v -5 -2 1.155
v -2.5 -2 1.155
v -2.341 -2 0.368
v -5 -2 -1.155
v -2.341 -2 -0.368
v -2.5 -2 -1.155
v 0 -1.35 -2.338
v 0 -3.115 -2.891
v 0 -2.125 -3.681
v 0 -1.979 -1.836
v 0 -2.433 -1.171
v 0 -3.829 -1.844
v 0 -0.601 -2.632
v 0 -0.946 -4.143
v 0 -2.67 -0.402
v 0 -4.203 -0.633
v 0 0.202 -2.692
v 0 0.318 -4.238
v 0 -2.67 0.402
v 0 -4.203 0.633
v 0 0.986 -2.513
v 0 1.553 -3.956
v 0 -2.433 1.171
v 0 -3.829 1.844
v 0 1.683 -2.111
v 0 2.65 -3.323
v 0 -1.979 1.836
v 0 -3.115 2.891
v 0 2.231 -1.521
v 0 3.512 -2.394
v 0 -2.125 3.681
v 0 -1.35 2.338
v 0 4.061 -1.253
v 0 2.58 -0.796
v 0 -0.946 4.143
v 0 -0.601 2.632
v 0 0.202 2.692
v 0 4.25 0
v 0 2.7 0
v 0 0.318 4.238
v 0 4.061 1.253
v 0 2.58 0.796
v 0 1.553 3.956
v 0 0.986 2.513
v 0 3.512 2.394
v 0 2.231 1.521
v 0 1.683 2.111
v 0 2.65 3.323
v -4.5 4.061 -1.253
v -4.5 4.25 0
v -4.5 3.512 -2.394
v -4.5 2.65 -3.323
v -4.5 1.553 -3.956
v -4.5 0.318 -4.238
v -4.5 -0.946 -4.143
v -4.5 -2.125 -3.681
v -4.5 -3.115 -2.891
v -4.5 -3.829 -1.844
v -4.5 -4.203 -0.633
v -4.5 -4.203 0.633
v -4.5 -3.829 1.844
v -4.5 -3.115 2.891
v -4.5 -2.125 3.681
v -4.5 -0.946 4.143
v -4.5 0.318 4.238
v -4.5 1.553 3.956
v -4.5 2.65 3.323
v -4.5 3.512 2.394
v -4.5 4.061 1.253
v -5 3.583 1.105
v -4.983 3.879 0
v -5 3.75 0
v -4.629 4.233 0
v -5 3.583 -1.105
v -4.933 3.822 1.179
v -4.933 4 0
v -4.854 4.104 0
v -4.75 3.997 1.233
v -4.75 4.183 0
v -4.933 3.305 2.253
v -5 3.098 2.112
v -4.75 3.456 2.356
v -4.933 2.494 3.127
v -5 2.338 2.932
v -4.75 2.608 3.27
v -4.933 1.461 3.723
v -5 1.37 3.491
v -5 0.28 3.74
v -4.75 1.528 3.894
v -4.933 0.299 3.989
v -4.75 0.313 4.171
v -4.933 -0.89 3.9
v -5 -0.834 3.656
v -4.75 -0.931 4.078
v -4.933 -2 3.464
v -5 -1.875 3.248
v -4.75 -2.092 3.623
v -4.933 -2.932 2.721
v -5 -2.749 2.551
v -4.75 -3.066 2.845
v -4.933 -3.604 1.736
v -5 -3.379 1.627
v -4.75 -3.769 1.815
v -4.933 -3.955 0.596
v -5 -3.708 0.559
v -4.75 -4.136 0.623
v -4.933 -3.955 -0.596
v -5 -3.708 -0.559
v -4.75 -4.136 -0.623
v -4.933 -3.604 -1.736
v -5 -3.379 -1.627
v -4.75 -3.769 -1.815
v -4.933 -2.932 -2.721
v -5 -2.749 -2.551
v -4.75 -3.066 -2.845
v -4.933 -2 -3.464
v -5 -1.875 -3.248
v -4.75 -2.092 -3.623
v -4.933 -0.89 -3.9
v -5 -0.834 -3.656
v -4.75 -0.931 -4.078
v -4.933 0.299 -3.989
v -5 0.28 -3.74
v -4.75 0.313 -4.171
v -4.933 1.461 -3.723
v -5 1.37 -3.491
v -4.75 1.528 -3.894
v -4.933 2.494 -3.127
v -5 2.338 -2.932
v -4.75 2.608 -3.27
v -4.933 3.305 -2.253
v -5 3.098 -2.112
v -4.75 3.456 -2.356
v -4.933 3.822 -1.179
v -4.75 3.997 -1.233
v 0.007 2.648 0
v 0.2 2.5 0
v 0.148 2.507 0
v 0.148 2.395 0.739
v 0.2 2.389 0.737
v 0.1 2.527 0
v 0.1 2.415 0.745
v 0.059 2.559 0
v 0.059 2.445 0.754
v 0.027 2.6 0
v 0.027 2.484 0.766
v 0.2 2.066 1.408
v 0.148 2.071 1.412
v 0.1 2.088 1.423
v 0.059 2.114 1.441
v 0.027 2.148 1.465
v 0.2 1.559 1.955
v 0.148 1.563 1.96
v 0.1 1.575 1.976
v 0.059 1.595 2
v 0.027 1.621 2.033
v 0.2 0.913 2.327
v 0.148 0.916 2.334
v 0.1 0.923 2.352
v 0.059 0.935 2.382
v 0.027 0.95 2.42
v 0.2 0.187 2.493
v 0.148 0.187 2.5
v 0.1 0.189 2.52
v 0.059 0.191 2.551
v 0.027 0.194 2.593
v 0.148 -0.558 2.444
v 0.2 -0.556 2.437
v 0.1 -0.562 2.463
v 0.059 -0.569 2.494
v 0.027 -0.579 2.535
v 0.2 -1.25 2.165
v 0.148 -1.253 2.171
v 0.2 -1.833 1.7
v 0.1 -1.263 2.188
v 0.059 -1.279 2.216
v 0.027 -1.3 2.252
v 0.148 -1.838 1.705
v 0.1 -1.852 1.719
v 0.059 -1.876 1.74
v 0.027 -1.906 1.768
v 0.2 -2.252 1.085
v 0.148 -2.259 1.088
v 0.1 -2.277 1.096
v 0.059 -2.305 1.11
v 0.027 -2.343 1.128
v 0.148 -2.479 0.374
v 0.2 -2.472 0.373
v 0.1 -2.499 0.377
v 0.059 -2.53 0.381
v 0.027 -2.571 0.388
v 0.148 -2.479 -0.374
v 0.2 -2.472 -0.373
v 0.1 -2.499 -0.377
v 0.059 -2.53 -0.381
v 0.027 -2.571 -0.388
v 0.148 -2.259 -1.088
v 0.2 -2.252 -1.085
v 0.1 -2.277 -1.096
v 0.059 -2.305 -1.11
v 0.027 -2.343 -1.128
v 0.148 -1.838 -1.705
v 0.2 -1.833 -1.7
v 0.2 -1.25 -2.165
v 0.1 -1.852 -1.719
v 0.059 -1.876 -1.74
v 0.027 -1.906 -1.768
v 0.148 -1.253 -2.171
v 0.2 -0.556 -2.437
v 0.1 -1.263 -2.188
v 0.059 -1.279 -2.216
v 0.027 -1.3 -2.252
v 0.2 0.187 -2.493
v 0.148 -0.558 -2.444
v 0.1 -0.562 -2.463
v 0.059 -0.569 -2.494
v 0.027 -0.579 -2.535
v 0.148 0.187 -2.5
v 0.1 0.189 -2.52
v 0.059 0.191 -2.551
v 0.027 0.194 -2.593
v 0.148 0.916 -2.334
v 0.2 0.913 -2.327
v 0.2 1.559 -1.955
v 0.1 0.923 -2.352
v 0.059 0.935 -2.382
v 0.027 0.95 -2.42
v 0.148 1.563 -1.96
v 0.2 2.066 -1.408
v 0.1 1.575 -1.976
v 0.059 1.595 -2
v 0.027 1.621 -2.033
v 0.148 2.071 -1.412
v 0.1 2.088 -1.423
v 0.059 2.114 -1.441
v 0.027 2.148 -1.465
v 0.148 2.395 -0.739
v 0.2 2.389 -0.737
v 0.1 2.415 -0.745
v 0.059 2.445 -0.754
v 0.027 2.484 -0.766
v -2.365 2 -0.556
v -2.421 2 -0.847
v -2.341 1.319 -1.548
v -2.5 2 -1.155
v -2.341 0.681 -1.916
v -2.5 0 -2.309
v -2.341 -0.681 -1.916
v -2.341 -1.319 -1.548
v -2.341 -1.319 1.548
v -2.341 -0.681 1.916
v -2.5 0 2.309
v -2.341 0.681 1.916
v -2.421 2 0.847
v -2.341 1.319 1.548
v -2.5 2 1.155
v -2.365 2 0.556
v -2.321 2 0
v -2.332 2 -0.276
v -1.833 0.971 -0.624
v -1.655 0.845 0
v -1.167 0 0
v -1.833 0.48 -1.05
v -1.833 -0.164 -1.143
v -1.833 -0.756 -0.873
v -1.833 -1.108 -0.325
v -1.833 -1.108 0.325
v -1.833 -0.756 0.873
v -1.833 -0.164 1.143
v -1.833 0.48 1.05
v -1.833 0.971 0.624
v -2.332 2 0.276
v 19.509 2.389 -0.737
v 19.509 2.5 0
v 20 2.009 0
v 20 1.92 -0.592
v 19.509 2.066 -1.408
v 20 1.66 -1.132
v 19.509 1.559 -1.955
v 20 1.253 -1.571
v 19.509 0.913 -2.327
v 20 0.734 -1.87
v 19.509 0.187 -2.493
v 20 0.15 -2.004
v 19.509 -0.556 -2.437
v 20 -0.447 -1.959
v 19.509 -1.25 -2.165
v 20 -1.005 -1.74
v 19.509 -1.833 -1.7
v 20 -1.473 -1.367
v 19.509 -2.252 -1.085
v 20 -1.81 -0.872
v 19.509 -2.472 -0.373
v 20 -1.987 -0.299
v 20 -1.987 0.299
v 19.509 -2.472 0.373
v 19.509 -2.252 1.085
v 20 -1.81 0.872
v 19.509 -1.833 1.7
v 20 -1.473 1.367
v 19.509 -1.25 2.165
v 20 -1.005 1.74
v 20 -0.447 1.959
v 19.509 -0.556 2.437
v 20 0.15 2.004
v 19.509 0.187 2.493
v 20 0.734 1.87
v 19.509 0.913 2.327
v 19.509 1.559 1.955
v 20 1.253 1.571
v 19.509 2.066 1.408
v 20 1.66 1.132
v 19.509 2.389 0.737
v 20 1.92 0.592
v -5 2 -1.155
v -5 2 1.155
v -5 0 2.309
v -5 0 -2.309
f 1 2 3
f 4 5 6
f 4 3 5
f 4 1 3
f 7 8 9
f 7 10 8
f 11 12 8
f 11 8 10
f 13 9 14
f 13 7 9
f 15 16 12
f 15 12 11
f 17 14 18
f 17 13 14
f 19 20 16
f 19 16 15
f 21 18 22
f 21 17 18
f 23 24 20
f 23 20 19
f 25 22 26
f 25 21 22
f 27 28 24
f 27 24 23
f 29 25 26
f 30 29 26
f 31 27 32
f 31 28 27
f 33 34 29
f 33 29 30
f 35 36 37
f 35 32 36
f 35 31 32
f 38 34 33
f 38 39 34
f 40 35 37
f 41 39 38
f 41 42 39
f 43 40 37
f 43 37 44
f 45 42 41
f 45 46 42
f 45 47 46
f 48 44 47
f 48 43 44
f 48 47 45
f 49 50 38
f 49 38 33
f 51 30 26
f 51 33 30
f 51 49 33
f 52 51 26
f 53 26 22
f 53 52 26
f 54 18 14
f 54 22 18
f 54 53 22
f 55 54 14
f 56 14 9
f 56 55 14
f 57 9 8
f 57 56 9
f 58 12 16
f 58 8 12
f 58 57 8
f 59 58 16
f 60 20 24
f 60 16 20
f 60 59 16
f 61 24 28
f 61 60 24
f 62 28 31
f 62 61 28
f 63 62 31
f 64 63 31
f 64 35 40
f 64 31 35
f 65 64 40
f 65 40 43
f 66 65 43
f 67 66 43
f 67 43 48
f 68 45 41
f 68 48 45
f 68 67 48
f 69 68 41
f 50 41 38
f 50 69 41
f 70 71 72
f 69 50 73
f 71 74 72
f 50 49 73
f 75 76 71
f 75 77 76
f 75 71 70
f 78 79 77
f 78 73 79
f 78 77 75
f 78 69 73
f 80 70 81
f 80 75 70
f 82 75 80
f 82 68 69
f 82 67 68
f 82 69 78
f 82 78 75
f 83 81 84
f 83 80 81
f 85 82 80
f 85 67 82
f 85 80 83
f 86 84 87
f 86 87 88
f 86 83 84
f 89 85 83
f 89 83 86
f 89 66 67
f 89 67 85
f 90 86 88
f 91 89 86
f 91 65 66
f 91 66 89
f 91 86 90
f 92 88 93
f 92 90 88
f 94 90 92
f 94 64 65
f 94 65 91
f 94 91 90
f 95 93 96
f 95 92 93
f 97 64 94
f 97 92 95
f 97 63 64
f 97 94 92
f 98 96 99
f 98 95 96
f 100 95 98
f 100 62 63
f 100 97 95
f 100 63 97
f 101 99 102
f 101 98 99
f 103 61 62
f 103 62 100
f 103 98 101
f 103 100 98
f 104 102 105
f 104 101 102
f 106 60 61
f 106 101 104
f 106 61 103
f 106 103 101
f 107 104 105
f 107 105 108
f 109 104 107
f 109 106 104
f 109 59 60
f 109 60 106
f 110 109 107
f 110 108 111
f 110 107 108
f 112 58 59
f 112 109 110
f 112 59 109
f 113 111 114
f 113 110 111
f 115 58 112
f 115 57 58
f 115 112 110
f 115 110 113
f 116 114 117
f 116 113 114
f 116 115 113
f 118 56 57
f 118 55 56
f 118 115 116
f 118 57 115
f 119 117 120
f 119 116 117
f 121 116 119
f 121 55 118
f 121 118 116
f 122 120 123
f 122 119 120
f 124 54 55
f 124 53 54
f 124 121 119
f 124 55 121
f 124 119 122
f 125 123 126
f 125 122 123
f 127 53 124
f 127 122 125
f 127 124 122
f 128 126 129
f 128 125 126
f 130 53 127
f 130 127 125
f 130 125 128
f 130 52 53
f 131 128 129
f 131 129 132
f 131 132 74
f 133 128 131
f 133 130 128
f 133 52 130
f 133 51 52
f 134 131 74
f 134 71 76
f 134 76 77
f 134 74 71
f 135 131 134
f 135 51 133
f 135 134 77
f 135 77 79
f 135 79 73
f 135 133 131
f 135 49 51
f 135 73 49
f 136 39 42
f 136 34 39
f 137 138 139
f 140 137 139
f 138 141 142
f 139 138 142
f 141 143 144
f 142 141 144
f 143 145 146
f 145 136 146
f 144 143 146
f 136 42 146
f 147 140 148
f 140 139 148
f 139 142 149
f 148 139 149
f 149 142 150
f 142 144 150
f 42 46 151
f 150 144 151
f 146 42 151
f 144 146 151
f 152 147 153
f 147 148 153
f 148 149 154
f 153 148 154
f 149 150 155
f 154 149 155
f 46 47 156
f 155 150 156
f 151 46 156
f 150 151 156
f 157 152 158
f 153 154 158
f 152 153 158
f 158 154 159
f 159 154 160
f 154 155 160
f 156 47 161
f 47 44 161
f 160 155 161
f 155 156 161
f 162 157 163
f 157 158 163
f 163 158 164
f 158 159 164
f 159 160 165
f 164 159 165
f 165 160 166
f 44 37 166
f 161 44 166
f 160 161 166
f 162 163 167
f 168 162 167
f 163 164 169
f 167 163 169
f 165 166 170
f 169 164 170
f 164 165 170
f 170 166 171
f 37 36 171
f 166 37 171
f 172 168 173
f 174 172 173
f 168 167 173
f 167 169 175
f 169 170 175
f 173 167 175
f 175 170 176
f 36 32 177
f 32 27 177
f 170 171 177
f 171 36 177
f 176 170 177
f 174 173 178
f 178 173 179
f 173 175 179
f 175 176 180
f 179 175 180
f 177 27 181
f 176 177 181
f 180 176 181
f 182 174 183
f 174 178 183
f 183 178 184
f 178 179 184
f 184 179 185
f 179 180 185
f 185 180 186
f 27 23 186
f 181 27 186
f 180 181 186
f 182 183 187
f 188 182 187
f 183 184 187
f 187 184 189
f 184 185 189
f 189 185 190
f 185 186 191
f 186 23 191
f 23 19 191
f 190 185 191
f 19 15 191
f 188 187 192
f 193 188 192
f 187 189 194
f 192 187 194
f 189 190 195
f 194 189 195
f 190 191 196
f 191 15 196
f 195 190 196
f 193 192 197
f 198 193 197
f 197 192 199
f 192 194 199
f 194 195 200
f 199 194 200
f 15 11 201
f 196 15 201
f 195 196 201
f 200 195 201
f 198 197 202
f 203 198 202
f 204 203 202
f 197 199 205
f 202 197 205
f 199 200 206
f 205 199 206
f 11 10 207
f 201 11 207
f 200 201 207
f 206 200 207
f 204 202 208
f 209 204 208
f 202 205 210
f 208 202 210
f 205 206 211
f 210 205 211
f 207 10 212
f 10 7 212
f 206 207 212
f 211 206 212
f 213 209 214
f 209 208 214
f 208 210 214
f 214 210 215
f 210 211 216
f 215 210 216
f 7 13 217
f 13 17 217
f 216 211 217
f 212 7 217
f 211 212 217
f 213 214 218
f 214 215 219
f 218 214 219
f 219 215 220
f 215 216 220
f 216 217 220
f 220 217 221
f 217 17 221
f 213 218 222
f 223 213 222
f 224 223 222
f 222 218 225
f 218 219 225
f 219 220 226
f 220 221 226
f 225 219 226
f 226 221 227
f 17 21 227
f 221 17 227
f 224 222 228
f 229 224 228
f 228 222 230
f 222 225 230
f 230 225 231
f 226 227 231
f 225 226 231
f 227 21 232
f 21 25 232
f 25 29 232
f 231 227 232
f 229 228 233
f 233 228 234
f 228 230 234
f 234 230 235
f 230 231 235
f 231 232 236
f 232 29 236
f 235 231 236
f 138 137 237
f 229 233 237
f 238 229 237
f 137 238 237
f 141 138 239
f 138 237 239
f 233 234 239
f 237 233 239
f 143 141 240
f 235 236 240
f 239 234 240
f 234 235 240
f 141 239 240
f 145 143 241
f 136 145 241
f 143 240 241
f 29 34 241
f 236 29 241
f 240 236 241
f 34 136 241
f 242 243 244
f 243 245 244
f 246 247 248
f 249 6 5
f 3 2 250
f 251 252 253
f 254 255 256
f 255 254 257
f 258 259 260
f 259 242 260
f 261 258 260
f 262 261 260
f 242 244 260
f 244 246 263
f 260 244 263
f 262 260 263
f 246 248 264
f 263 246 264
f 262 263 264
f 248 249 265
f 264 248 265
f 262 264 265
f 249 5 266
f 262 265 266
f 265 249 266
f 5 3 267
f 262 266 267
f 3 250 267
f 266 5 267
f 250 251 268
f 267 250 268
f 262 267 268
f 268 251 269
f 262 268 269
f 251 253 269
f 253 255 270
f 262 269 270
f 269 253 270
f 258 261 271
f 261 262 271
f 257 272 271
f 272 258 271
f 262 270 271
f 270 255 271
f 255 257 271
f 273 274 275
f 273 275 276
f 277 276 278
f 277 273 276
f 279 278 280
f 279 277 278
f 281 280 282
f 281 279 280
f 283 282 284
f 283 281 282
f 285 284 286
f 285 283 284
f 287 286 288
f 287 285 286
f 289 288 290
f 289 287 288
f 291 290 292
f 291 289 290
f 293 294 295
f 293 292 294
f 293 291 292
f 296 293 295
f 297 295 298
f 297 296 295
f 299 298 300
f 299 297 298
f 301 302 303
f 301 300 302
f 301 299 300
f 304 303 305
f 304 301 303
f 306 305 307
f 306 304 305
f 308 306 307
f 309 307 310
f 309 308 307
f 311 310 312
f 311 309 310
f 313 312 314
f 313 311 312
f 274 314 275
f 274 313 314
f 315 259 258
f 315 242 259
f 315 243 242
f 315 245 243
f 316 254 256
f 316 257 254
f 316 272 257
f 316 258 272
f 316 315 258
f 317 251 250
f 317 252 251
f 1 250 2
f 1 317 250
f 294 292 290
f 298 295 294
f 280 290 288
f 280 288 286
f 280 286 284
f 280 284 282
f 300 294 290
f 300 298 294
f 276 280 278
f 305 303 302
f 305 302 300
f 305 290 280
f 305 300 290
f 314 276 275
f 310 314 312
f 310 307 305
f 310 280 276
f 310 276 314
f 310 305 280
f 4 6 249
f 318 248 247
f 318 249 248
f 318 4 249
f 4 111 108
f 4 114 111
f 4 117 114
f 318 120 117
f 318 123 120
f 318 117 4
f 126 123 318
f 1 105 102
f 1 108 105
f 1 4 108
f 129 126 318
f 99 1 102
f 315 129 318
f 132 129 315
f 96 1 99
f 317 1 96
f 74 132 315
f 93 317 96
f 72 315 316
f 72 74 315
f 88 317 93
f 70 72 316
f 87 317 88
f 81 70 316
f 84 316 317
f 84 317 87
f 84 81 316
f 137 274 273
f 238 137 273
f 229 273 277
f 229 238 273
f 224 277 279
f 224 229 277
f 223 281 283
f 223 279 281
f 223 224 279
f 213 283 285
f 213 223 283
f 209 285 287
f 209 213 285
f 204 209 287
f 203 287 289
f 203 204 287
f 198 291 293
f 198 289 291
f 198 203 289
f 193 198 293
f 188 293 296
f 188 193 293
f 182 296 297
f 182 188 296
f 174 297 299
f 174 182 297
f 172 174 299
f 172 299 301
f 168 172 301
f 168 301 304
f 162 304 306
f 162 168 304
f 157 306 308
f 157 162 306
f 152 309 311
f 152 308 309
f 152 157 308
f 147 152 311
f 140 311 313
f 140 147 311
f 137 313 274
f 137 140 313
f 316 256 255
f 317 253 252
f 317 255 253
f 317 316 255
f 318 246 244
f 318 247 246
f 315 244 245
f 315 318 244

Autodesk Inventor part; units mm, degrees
ref_plane "YZ Plane" through (0, 0, 0) normal (1, 0, 0) x (0, 1, 0)
ref_plane "XZ Plane" through (0, 0, 0) normal (0, 1, 0) x (-1, 0, 0)
sketch "Esquisse1" plane through (0, 0, 0) normal (0, 0, 1) x (1, 0, 0)
  line L0 (-1.1667, 0) -> (20, 0)
  line L1 (20, 0) -> (20, 2.5)
  line L2 (20, 2.5) -> (1.4815, 2.5)
  line L3 (1.4815, 2.5) -> (0.9908, 2.5)
  line L4 (0.9908, 2.5) -> (0, 2.5)
  line L5 (0, 2.5) -> (0, 4.25)
  line L6 (0, 4.25) -> (-5, 4.25)
  line L7 (-5, 4.25) -> (-5, 2.3094)
  line L8 (-5, 2.3094) -> (-2.5, 2.3094)
  line L9 (-2.5, 2.3094) -> (-1.1667, 0)
  line L10 (-10, 0) -> (25, 0) projected
  line L11 (0, -0.85) -> (0, 5.1) projected
  line L12 (1.4815, 2.5) -> (0, 2.5) construction
  dimension "d0" = 18.5185
  dimension "d1" = 0.4908
  dimension "d2" = 5
  dimension "d3" = 2.5
  dimension "d4" = 60
  dimension "d5" = 5
  dimension "d6" = 5
  dimension "d7" = 4.6188
  dimension "d8" = 8.5
  dimension "d19" = 20
revolve "Corps" add sketch "Esquisse1" angle 360 about axis through (-1.1667, 0, 0) along (1, 0, 0)
sketch "Esquisse2" plane through (-5, 0, 0) normal (-1, 0, 0) x (0, 0, 1)
  circle A0 centre (0, 0) radius 2.3094 projected
  line L0 (0, -5.95) -> (0, 5.95) projected
  line L1 (-5.95, 0) -> (5.95, 0) projected
  line L2 (2.3094, 0) -> (1.1547, -2)
  line L3 (1.1547, -2) -> (-1.1547, -2)
  line L4 (-1.1547, -2) -> (-2.3094, 0)
  line L5 (-2.3094, 0) -> (-1.1547, 2)
  line L6 (-1.1547, 2) -> (1.1547, 2)
  line L7 (1.1547, 2) -> (2.3094, 0)
extrude "Rainure" add sketch "Esquisse2" against normal up to next contours L7 A0 | A0 L2 | L6 L0 A0 | A0 L0 L3 | L0 L6 A0 | A0 L3 L0 | L4 A0 | A0 L5
fillet "Congé2" radius 0.5 1 edges at (-5, -4.25, 0)
thread "Filetage" size "M5x0.8" class "6g" standard "ISO Metric profile" length 18.5185
chamfer "Chanfrein1" distance 0.4908 distance2 0.4908 1 edges at (20, -2.5, 0) measured on face at (20, -0.7379, -0.3873)
fillet "Congé1" radius 0.2 1 edges at (0, -2.5, 0)
ref_plane "Work Plane1" through (30, 0, 0) normal (0, -0.5, 0.866) x (1, 0, 0)
equation "\"d0\" = GEL"
equation "\"d1\" = GAL"
equation "\"d2\" = KOH"
equation "\"d3\" = INTI"
equation "\"d5\" = GD"
equation "\"d6\" = BDM"
equation "\"d7\" = 1.1547 * SW"
equation "\"d8\" = KOD"
equation "\"d19\" = NLG"
equation "\"d16\" = RR"
equation "\"d12\" = GEL"
equation "\"d14\" = -0.5 * SPD + 0.5 * GD"
equation "\"d15\" = GUL"
equation "\"d29\" = R"
equation "\"GD\" = NND"
equation "\"NLG\" = 20"
equation "\"GEL\" = 18.51848"
equation "\"KOD\" = 8.5"
equation "\"KOH\" = 5"
equation "\"INTI\" = 2.5"
equation "\"GAL\" = 0.61345 * PTC"
equation "\"GUL\" = 0.61345 * PTC"
equation "\"BDM\" = NND"
equation "\"SW\" = 4"
equation "\"RR\" = 0.5"
equation "\"SPD\" = 4.01848"
equation "\"d28\" = R"
equation "\"R\" = 0.2"
equation "\"TOA\" = 30deg"
equation "\"THREADDIA\" = 5"
equation "\"KOD1\" = KOD"
equation "\"PTC\" = 0.8"
equation "\"NND\" = 5"
equation "\"E0\" = 1.155 * SW"
equation "\"GD1\" = THREADDIA - 1.2269 * PTC"
properties part number "ANSI B18.3.1M - M5x0,8 x 20" material "Acier, doux"
